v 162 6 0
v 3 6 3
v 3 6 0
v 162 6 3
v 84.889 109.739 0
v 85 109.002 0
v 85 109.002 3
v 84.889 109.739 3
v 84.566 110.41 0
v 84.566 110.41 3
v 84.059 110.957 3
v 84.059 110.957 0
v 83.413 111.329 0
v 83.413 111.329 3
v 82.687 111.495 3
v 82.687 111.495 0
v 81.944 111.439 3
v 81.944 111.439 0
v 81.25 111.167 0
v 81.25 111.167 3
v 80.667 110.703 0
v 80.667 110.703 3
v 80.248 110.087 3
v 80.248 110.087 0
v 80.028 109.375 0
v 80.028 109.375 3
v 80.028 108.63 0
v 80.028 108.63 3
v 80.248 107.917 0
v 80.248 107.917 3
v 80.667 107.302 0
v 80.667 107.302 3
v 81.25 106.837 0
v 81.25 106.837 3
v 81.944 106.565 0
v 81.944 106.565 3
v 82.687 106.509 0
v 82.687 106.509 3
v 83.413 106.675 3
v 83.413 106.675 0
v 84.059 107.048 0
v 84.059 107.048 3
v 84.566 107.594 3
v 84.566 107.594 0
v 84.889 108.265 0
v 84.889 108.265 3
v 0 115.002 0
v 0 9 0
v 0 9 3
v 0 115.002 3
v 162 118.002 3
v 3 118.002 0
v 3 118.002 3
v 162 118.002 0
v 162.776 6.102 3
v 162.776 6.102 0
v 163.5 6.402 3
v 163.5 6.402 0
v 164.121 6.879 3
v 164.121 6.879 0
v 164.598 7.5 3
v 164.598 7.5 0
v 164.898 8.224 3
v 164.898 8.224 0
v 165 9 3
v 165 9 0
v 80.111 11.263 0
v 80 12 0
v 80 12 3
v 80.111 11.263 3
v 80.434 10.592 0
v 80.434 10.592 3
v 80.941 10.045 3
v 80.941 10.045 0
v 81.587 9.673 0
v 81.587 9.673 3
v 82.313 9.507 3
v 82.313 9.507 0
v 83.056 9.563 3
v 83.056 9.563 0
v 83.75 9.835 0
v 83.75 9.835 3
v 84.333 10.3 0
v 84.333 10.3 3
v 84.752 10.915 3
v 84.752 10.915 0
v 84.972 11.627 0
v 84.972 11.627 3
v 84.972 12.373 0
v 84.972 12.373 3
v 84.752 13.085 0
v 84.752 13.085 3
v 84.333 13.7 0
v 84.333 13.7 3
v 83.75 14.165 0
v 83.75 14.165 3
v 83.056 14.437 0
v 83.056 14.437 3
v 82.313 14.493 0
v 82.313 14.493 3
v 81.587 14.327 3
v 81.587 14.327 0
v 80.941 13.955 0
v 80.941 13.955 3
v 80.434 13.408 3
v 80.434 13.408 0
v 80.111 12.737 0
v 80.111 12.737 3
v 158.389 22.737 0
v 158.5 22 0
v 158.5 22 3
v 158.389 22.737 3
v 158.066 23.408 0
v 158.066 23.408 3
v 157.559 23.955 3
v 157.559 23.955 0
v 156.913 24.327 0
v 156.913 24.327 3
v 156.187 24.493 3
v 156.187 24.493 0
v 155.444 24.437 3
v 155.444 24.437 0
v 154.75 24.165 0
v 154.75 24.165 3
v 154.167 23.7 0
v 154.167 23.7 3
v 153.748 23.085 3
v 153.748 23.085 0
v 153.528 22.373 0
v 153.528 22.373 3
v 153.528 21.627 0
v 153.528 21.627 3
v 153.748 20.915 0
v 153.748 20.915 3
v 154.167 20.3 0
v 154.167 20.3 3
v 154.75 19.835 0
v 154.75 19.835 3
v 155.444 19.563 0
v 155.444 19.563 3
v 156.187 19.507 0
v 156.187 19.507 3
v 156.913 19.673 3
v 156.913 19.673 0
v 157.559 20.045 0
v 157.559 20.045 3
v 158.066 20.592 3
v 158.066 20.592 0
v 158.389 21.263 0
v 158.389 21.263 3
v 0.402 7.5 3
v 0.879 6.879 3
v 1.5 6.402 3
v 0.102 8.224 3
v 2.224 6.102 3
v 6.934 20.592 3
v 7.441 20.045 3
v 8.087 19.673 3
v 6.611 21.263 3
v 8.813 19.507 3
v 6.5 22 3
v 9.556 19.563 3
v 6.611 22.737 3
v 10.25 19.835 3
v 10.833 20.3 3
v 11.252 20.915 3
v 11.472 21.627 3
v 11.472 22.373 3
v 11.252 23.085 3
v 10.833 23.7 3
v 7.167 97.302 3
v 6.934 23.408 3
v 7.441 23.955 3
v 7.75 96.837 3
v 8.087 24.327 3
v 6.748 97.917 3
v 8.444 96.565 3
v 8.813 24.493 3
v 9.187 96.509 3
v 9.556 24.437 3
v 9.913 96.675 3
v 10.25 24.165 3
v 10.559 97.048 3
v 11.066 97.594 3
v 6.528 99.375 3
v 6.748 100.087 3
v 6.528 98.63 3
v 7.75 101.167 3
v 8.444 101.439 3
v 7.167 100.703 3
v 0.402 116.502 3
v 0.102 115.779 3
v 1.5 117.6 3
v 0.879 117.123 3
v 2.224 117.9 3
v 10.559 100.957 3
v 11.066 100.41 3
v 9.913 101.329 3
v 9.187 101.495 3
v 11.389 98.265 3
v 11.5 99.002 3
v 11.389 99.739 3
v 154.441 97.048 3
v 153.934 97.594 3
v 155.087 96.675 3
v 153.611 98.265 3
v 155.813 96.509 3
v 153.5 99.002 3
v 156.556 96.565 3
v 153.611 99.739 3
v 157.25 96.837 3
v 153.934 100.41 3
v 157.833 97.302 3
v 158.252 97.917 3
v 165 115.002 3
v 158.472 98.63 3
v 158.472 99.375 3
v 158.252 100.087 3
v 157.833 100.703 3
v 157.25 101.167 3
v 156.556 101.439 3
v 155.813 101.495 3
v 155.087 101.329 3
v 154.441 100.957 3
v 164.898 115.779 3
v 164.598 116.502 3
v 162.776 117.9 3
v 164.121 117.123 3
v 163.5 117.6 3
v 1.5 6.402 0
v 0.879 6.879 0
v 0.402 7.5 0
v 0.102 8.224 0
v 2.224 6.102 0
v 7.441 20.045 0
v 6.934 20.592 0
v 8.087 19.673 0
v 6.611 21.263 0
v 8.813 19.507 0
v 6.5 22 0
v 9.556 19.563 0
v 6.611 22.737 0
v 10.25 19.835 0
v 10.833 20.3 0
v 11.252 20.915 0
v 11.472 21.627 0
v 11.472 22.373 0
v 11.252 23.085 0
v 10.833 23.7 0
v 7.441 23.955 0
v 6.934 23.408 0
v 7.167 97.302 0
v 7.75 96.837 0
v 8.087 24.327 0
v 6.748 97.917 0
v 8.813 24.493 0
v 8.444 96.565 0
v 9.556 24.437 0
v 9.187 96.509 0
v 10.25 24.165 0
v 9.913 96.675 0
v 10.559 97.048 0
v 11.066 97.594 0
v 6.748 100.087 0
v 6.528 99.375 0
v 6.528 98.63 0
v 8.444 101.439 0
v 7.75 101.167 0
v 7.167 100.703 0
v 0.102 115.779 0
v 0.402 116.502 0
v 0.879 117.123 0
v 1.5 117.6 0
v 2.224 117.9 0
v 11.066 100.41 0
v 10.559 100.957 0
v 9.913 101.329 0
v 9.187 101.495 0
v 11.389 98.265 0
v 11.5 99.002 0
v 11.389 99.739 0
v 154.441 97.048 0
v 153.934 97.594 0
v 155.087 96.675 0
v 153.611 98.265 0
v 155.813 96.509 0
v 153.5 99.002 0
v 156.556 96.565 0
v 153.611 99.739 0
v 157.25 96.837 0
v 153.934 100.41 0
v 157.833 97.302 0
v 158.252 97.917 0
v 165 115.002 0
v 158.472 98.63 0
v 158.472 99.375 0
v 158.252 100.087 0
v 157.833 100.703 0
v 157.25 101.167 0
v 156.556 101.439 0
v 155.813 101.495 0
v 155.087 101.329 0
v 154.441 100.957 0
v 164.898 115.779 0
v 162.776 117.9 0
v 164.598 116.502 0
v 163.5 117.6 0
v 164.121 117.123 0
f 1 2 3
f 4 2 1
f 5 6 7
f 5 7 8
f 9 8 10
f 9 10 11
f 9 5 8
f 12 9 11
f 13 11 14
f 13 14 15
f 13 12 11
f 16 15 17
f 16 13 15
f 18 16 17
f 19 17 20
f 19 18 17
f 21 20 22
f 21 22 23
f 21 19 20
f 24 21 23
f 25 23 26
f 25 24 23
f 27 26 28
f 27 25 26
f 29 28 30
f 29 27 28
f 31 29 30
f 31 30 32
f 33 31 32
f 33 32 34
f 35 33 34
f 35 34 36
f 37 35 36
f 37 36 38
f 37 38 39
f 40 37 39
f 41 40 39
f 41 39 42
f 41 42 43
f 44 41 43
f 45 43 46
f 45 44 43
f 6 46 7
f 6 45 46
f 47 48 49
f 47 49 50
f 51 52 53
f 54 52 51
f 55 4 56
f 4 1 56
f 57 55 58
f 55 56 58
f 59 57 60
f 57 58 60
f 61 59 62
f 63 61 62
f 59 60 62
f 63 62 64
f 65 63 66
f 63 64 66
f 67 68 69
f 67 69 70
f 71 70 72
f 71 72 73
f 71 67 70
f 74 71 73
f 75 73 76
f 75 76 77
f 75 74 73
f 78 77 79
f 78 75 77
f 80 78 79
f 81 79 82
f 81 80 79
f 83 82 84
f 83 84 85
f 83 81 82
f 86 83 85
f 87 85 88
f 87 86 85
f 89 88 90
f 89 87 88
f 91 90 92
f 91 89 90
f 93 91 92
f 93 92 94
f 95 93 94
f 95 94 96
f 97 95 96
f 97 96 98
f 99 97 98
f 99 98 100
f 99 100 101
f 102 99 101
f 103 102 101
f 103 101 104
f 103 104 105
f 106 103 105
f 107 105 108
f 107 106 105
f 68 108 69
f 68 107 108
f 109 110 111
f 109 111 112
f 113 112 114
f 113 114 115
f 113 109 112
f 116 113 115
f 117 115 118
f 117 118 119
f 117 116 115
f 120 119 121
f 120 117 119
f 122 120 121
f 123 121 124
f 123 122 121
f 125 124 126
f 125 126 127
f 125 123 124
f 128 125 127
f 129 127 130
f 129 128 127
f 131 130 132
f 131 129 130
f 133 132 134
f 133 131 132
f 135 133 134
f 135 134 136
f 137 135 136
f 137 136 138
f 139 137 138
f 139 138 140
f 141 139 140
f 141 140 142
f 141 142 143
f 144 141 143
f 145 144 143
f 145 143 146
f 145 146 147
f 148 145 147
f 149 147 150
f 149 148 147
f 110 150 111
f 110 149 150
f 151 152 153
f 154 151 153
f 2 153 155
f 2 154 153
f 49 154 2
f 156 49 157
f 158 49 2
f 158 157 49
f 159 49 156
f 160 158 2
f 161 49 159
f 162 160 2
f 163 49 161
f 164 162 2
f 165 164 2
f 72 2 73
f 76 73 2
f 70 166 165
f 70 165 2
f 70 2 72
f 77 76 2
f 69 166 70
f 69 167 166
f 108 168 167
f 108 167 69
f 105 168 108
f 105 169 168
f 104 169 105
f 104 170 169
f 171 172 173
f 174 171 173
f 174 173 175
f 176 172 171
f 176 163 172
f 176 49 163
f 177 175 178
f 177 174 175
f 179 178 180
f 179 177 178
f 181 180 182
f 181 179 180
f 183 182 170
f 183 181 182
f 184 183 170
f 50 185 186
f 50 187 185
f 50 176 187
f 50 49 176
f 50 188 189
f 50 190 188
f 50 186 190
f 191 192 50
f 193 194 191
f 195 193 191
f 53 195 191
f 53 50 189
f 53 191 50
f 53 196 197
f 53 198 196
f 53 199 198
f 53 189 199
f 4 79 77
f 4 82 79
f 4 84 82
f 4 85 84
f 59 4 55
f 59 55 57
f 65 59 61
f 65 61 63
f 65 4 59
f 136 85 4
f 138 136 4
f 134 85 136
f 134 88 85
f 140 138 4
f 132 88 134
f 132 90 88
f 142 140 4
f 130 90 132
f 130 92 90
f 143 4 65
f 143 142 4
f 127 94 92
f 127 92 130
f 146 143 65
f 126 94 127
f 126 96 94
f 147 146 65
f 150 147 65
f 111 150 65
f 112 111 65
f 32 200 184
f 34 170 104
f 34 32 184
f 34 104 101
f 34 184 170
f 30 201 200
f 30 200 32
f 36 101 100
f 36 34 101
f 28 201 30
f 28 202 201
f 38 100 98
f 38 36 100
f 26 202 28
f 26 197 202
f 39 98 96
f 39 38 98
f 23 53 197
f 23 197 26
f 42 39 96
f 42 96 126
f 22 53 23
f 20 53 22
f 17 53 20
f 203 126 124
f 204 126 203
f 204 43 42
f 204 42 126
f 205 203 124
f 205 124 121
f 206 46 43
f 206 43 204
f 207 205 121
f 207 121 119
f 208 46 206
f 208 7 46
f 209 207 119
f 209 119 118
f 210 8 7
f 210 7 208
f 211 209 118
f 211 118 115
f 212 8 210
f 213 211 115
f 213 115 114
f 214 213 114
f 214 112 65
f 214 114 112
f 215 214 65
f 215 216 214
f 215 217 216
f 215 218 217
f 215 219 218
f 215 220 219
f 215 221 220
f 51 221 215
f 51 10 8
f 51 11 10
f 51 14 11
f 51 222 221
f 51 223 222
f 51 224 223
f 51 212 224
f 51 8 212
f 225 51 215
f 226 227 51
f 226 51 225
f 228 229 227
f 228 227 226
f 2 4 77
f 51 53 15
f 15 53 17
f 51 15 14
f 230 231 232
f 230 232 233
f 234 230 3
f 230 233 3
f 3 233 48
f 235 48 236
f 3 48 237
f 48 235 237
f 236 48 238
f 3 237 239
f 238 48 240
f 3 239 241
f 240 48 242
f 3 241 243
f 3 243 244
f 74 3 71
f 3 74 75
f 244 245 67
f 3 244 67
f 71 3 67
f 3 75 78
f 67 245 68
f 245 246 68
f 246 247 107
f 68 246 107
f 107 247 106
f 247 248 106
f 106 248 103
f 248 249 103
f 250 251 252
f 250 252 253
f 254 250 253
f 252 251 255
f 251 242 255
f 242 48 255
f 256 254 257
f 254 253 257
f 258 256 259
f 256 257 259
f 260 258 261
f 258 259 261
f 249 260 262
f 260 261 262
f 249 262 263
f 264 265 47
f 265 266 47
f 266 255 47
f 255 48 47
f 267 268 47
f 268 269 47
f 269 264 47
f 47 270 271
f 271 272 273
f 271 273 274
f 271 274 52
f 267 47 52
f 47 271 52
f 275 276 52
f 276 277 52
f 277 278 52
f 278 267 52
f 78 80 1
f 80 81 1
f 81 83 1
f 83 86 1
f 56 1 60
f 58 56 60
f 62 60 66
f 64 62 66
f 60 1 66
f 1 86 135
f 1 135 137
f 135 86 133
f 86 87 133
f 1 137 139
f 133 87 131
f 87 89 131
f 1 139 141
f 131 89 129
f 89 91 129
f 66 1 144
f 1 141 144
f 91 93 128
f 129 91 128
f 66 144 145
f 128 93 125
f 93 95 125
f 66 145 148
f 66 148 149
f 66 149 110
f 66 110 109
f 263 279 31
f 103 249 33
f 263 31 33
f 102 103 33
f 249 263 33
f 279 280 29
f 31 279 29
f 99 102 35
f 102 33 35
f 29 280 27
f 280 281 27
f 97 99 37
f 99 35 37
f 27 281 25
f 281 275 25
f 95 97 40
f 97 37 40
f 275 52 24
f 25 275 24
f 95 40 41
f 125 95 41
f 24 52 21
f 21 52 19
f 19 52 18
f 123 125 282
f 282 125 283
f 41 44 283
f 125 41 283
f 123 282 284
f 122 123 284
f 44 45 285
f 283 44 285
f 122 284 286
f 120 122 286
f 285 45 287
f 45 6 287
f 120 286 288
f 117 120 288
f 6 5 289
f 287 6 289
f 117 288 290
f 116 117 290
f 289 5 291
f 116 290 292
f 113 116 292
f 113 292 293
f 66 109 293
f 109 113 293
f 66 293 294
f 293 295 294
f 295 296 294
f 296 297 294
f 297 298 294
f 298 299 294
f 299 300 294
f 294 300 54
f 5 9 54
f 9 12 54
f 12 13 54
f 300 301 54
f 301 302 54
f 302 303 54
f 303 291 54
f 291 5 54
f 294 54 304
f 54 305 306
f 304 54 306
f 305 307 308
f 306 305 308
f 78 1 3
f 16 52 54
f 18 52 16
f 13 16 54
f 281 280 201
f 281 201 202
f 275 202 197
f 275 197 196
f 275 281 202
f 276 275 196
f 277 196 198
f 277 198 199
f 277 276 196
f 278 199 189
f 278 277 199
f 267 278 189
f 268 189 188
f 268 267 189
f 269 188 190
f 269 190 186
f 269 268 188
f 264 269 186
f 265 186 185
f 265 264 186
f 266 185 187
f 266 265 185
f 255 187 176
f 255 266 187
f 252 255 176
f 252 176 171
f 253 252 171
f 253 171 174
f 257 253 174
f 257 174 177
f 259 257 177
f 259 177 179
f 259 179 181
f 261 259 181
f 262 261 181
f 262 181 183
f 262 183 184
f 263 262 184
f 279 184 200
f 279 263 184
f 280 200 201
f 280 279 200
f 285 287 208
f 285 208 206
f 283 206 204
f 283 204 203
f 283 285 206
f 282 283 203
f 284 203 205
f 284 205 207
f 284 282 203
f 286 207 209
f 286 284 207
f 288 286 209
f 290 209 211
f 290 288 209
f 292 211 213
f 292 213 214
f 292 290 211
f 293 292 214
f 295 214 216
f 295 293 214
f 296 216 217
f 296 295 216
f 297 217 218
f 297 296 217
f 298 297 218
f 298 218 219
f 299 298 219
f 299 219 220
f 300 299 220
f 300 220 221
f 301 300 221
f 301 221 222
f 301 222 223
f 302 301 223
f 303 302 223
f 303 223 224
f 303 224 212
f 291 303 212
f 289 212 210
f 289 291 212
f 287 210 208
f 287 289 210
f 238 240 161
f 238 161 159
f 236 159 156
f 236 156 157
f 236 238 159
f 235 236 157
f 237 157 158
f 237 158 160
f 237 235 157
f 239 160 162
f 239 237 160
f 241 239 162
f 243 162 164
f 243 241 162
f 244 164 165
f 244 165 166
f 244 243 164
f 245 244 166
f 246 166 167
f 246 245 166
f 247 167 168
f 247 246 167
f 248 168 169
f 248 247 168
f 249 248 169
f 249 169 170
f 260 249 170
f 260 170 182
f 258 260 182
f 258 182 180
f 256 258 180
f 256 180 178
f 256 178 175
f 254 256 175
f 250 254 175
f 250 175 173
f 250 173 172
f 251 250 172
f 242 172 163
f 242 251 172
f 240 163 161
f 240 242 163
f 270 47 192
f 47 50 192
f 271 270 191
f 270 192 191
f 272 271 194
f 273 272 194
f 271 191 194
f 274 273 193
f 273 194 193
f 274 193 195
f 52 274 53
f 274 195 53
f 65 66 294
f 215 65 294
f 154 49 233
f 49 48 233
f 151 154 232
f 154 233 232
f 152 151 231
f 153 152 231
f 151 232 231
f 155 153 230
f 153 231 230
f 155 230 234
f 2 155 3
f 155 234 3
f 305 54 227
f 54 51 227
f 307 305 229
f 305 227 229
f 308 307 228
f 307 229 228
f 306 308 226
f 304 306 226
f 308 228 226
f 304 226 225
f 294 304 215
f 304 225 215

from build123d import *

# Parameters (mm, degrees)
SKETCH_1_W          = 165
SKETCH_1_H          = 118.00212
SKETCH_1_R          = 2.5
EXTRUDE_1_DEPTH     = 3
FILLET_1_R          = 3
CUT_EXTRUDE_START   = -10
CUT_EXTRUDE_1_DEPTH = 10
FILLET_2_R          = 3


with BuildPart() as part:
    # ｽｹｯﾁ1 → ﾎﾞｽ - 押し出し1 (new body)
    with BuildSketch(Plane.XY):
        with Locations((82.5, 59.00106)):
            Rectangle(SKETCH_1_W, SKETCH_1_H)
        with Locations((82.5, 109.00212)):
            Circle(SKETCH_1_R, mode=Mode.SUBTRACT)
        with Locations((9, 99.00212)):
            Circle(SKETCH_1_R, mode=Mode.SUBTRACT)
        with Locations(Location((9, 22, 0), (0, 0, 180))):
            Circle(SKETCH_1_R, mode=Mode.SUBTRACT)
        with Locations(Location((82.5, 12, 0), (0, 0, 180))):
            Circle(SKETCH_1_R, mode=Mode.SUBTRACT)
        with Locations(Location((156, 99.00212, 0), (0, 0, 180))):
            Circle(SKETCH_1_R, mode=Mode.SUBTRACT)
        with Locations((156, 22)):
            Circle(SKETCH_1_R, mode=Mode.SUBTRACT)
    extrude(amount=EXTRUDE_1_DEPTH)

    # ﾌｨﾚｯﾄ1
    fillet_1_edges = [part.edges().sort_by_distance(p)[0] for p in [
        (0, 0, 1.5),
        (0, 118.00212, 1.5),
        (165, 118.00212, 1.5),
        (165, 0, 1.5),
    ]]
    fillet(fillet_1_edges, radius=FILLET_1_R)

    # ｽｹｯﾁ3 → ｶｯﾄ - 押し出し1 (cut)
    with BuildSketch(Plane(origin=(0, 0, 0), x_dir=(-1, 0, 0), z_dir=(0, 0, -1)).offset(CUT_EXTRUDE_START)):
        with BuildLine():
            Line((-162, 0), (-82.5, 0))
            Line((-82.5, 0), (-82.5, 6))
            Line((-82.5, 6), (-165, 6))
            Line((-165, 6), (-165, 3))
            ThreePointArc((-165, 3), (-164.121320344, 0.878679656), (-162, 0))
        make_face()
        with BuildLine():
            Line((-82.5, 6), (-82.5, 0))
            Line((-82.5, 0), (-3, 0))
            ThreePointArc((-3, 0), (-0.878679656, 0.878679656), (0, 3))
            Line((0, 3), (0, 6))
            Line((0, 6), (-82.5, 6))
        make_face()
    extrude(amount=CUT_EXTRUDE_1_DEPTH, mode=Mode.SUBTRACT)

    # ﾌｨﾚｯﾄ2
    fillet_2_edges = [part.edges().sort_by_distance(p)[0] for p in [
        (165, 6, 1.5),
        (0, 6, 1.5),
    ]]
    fillet(fillet_2_edges, radius=FILLET_2_R)


solid = part.part
